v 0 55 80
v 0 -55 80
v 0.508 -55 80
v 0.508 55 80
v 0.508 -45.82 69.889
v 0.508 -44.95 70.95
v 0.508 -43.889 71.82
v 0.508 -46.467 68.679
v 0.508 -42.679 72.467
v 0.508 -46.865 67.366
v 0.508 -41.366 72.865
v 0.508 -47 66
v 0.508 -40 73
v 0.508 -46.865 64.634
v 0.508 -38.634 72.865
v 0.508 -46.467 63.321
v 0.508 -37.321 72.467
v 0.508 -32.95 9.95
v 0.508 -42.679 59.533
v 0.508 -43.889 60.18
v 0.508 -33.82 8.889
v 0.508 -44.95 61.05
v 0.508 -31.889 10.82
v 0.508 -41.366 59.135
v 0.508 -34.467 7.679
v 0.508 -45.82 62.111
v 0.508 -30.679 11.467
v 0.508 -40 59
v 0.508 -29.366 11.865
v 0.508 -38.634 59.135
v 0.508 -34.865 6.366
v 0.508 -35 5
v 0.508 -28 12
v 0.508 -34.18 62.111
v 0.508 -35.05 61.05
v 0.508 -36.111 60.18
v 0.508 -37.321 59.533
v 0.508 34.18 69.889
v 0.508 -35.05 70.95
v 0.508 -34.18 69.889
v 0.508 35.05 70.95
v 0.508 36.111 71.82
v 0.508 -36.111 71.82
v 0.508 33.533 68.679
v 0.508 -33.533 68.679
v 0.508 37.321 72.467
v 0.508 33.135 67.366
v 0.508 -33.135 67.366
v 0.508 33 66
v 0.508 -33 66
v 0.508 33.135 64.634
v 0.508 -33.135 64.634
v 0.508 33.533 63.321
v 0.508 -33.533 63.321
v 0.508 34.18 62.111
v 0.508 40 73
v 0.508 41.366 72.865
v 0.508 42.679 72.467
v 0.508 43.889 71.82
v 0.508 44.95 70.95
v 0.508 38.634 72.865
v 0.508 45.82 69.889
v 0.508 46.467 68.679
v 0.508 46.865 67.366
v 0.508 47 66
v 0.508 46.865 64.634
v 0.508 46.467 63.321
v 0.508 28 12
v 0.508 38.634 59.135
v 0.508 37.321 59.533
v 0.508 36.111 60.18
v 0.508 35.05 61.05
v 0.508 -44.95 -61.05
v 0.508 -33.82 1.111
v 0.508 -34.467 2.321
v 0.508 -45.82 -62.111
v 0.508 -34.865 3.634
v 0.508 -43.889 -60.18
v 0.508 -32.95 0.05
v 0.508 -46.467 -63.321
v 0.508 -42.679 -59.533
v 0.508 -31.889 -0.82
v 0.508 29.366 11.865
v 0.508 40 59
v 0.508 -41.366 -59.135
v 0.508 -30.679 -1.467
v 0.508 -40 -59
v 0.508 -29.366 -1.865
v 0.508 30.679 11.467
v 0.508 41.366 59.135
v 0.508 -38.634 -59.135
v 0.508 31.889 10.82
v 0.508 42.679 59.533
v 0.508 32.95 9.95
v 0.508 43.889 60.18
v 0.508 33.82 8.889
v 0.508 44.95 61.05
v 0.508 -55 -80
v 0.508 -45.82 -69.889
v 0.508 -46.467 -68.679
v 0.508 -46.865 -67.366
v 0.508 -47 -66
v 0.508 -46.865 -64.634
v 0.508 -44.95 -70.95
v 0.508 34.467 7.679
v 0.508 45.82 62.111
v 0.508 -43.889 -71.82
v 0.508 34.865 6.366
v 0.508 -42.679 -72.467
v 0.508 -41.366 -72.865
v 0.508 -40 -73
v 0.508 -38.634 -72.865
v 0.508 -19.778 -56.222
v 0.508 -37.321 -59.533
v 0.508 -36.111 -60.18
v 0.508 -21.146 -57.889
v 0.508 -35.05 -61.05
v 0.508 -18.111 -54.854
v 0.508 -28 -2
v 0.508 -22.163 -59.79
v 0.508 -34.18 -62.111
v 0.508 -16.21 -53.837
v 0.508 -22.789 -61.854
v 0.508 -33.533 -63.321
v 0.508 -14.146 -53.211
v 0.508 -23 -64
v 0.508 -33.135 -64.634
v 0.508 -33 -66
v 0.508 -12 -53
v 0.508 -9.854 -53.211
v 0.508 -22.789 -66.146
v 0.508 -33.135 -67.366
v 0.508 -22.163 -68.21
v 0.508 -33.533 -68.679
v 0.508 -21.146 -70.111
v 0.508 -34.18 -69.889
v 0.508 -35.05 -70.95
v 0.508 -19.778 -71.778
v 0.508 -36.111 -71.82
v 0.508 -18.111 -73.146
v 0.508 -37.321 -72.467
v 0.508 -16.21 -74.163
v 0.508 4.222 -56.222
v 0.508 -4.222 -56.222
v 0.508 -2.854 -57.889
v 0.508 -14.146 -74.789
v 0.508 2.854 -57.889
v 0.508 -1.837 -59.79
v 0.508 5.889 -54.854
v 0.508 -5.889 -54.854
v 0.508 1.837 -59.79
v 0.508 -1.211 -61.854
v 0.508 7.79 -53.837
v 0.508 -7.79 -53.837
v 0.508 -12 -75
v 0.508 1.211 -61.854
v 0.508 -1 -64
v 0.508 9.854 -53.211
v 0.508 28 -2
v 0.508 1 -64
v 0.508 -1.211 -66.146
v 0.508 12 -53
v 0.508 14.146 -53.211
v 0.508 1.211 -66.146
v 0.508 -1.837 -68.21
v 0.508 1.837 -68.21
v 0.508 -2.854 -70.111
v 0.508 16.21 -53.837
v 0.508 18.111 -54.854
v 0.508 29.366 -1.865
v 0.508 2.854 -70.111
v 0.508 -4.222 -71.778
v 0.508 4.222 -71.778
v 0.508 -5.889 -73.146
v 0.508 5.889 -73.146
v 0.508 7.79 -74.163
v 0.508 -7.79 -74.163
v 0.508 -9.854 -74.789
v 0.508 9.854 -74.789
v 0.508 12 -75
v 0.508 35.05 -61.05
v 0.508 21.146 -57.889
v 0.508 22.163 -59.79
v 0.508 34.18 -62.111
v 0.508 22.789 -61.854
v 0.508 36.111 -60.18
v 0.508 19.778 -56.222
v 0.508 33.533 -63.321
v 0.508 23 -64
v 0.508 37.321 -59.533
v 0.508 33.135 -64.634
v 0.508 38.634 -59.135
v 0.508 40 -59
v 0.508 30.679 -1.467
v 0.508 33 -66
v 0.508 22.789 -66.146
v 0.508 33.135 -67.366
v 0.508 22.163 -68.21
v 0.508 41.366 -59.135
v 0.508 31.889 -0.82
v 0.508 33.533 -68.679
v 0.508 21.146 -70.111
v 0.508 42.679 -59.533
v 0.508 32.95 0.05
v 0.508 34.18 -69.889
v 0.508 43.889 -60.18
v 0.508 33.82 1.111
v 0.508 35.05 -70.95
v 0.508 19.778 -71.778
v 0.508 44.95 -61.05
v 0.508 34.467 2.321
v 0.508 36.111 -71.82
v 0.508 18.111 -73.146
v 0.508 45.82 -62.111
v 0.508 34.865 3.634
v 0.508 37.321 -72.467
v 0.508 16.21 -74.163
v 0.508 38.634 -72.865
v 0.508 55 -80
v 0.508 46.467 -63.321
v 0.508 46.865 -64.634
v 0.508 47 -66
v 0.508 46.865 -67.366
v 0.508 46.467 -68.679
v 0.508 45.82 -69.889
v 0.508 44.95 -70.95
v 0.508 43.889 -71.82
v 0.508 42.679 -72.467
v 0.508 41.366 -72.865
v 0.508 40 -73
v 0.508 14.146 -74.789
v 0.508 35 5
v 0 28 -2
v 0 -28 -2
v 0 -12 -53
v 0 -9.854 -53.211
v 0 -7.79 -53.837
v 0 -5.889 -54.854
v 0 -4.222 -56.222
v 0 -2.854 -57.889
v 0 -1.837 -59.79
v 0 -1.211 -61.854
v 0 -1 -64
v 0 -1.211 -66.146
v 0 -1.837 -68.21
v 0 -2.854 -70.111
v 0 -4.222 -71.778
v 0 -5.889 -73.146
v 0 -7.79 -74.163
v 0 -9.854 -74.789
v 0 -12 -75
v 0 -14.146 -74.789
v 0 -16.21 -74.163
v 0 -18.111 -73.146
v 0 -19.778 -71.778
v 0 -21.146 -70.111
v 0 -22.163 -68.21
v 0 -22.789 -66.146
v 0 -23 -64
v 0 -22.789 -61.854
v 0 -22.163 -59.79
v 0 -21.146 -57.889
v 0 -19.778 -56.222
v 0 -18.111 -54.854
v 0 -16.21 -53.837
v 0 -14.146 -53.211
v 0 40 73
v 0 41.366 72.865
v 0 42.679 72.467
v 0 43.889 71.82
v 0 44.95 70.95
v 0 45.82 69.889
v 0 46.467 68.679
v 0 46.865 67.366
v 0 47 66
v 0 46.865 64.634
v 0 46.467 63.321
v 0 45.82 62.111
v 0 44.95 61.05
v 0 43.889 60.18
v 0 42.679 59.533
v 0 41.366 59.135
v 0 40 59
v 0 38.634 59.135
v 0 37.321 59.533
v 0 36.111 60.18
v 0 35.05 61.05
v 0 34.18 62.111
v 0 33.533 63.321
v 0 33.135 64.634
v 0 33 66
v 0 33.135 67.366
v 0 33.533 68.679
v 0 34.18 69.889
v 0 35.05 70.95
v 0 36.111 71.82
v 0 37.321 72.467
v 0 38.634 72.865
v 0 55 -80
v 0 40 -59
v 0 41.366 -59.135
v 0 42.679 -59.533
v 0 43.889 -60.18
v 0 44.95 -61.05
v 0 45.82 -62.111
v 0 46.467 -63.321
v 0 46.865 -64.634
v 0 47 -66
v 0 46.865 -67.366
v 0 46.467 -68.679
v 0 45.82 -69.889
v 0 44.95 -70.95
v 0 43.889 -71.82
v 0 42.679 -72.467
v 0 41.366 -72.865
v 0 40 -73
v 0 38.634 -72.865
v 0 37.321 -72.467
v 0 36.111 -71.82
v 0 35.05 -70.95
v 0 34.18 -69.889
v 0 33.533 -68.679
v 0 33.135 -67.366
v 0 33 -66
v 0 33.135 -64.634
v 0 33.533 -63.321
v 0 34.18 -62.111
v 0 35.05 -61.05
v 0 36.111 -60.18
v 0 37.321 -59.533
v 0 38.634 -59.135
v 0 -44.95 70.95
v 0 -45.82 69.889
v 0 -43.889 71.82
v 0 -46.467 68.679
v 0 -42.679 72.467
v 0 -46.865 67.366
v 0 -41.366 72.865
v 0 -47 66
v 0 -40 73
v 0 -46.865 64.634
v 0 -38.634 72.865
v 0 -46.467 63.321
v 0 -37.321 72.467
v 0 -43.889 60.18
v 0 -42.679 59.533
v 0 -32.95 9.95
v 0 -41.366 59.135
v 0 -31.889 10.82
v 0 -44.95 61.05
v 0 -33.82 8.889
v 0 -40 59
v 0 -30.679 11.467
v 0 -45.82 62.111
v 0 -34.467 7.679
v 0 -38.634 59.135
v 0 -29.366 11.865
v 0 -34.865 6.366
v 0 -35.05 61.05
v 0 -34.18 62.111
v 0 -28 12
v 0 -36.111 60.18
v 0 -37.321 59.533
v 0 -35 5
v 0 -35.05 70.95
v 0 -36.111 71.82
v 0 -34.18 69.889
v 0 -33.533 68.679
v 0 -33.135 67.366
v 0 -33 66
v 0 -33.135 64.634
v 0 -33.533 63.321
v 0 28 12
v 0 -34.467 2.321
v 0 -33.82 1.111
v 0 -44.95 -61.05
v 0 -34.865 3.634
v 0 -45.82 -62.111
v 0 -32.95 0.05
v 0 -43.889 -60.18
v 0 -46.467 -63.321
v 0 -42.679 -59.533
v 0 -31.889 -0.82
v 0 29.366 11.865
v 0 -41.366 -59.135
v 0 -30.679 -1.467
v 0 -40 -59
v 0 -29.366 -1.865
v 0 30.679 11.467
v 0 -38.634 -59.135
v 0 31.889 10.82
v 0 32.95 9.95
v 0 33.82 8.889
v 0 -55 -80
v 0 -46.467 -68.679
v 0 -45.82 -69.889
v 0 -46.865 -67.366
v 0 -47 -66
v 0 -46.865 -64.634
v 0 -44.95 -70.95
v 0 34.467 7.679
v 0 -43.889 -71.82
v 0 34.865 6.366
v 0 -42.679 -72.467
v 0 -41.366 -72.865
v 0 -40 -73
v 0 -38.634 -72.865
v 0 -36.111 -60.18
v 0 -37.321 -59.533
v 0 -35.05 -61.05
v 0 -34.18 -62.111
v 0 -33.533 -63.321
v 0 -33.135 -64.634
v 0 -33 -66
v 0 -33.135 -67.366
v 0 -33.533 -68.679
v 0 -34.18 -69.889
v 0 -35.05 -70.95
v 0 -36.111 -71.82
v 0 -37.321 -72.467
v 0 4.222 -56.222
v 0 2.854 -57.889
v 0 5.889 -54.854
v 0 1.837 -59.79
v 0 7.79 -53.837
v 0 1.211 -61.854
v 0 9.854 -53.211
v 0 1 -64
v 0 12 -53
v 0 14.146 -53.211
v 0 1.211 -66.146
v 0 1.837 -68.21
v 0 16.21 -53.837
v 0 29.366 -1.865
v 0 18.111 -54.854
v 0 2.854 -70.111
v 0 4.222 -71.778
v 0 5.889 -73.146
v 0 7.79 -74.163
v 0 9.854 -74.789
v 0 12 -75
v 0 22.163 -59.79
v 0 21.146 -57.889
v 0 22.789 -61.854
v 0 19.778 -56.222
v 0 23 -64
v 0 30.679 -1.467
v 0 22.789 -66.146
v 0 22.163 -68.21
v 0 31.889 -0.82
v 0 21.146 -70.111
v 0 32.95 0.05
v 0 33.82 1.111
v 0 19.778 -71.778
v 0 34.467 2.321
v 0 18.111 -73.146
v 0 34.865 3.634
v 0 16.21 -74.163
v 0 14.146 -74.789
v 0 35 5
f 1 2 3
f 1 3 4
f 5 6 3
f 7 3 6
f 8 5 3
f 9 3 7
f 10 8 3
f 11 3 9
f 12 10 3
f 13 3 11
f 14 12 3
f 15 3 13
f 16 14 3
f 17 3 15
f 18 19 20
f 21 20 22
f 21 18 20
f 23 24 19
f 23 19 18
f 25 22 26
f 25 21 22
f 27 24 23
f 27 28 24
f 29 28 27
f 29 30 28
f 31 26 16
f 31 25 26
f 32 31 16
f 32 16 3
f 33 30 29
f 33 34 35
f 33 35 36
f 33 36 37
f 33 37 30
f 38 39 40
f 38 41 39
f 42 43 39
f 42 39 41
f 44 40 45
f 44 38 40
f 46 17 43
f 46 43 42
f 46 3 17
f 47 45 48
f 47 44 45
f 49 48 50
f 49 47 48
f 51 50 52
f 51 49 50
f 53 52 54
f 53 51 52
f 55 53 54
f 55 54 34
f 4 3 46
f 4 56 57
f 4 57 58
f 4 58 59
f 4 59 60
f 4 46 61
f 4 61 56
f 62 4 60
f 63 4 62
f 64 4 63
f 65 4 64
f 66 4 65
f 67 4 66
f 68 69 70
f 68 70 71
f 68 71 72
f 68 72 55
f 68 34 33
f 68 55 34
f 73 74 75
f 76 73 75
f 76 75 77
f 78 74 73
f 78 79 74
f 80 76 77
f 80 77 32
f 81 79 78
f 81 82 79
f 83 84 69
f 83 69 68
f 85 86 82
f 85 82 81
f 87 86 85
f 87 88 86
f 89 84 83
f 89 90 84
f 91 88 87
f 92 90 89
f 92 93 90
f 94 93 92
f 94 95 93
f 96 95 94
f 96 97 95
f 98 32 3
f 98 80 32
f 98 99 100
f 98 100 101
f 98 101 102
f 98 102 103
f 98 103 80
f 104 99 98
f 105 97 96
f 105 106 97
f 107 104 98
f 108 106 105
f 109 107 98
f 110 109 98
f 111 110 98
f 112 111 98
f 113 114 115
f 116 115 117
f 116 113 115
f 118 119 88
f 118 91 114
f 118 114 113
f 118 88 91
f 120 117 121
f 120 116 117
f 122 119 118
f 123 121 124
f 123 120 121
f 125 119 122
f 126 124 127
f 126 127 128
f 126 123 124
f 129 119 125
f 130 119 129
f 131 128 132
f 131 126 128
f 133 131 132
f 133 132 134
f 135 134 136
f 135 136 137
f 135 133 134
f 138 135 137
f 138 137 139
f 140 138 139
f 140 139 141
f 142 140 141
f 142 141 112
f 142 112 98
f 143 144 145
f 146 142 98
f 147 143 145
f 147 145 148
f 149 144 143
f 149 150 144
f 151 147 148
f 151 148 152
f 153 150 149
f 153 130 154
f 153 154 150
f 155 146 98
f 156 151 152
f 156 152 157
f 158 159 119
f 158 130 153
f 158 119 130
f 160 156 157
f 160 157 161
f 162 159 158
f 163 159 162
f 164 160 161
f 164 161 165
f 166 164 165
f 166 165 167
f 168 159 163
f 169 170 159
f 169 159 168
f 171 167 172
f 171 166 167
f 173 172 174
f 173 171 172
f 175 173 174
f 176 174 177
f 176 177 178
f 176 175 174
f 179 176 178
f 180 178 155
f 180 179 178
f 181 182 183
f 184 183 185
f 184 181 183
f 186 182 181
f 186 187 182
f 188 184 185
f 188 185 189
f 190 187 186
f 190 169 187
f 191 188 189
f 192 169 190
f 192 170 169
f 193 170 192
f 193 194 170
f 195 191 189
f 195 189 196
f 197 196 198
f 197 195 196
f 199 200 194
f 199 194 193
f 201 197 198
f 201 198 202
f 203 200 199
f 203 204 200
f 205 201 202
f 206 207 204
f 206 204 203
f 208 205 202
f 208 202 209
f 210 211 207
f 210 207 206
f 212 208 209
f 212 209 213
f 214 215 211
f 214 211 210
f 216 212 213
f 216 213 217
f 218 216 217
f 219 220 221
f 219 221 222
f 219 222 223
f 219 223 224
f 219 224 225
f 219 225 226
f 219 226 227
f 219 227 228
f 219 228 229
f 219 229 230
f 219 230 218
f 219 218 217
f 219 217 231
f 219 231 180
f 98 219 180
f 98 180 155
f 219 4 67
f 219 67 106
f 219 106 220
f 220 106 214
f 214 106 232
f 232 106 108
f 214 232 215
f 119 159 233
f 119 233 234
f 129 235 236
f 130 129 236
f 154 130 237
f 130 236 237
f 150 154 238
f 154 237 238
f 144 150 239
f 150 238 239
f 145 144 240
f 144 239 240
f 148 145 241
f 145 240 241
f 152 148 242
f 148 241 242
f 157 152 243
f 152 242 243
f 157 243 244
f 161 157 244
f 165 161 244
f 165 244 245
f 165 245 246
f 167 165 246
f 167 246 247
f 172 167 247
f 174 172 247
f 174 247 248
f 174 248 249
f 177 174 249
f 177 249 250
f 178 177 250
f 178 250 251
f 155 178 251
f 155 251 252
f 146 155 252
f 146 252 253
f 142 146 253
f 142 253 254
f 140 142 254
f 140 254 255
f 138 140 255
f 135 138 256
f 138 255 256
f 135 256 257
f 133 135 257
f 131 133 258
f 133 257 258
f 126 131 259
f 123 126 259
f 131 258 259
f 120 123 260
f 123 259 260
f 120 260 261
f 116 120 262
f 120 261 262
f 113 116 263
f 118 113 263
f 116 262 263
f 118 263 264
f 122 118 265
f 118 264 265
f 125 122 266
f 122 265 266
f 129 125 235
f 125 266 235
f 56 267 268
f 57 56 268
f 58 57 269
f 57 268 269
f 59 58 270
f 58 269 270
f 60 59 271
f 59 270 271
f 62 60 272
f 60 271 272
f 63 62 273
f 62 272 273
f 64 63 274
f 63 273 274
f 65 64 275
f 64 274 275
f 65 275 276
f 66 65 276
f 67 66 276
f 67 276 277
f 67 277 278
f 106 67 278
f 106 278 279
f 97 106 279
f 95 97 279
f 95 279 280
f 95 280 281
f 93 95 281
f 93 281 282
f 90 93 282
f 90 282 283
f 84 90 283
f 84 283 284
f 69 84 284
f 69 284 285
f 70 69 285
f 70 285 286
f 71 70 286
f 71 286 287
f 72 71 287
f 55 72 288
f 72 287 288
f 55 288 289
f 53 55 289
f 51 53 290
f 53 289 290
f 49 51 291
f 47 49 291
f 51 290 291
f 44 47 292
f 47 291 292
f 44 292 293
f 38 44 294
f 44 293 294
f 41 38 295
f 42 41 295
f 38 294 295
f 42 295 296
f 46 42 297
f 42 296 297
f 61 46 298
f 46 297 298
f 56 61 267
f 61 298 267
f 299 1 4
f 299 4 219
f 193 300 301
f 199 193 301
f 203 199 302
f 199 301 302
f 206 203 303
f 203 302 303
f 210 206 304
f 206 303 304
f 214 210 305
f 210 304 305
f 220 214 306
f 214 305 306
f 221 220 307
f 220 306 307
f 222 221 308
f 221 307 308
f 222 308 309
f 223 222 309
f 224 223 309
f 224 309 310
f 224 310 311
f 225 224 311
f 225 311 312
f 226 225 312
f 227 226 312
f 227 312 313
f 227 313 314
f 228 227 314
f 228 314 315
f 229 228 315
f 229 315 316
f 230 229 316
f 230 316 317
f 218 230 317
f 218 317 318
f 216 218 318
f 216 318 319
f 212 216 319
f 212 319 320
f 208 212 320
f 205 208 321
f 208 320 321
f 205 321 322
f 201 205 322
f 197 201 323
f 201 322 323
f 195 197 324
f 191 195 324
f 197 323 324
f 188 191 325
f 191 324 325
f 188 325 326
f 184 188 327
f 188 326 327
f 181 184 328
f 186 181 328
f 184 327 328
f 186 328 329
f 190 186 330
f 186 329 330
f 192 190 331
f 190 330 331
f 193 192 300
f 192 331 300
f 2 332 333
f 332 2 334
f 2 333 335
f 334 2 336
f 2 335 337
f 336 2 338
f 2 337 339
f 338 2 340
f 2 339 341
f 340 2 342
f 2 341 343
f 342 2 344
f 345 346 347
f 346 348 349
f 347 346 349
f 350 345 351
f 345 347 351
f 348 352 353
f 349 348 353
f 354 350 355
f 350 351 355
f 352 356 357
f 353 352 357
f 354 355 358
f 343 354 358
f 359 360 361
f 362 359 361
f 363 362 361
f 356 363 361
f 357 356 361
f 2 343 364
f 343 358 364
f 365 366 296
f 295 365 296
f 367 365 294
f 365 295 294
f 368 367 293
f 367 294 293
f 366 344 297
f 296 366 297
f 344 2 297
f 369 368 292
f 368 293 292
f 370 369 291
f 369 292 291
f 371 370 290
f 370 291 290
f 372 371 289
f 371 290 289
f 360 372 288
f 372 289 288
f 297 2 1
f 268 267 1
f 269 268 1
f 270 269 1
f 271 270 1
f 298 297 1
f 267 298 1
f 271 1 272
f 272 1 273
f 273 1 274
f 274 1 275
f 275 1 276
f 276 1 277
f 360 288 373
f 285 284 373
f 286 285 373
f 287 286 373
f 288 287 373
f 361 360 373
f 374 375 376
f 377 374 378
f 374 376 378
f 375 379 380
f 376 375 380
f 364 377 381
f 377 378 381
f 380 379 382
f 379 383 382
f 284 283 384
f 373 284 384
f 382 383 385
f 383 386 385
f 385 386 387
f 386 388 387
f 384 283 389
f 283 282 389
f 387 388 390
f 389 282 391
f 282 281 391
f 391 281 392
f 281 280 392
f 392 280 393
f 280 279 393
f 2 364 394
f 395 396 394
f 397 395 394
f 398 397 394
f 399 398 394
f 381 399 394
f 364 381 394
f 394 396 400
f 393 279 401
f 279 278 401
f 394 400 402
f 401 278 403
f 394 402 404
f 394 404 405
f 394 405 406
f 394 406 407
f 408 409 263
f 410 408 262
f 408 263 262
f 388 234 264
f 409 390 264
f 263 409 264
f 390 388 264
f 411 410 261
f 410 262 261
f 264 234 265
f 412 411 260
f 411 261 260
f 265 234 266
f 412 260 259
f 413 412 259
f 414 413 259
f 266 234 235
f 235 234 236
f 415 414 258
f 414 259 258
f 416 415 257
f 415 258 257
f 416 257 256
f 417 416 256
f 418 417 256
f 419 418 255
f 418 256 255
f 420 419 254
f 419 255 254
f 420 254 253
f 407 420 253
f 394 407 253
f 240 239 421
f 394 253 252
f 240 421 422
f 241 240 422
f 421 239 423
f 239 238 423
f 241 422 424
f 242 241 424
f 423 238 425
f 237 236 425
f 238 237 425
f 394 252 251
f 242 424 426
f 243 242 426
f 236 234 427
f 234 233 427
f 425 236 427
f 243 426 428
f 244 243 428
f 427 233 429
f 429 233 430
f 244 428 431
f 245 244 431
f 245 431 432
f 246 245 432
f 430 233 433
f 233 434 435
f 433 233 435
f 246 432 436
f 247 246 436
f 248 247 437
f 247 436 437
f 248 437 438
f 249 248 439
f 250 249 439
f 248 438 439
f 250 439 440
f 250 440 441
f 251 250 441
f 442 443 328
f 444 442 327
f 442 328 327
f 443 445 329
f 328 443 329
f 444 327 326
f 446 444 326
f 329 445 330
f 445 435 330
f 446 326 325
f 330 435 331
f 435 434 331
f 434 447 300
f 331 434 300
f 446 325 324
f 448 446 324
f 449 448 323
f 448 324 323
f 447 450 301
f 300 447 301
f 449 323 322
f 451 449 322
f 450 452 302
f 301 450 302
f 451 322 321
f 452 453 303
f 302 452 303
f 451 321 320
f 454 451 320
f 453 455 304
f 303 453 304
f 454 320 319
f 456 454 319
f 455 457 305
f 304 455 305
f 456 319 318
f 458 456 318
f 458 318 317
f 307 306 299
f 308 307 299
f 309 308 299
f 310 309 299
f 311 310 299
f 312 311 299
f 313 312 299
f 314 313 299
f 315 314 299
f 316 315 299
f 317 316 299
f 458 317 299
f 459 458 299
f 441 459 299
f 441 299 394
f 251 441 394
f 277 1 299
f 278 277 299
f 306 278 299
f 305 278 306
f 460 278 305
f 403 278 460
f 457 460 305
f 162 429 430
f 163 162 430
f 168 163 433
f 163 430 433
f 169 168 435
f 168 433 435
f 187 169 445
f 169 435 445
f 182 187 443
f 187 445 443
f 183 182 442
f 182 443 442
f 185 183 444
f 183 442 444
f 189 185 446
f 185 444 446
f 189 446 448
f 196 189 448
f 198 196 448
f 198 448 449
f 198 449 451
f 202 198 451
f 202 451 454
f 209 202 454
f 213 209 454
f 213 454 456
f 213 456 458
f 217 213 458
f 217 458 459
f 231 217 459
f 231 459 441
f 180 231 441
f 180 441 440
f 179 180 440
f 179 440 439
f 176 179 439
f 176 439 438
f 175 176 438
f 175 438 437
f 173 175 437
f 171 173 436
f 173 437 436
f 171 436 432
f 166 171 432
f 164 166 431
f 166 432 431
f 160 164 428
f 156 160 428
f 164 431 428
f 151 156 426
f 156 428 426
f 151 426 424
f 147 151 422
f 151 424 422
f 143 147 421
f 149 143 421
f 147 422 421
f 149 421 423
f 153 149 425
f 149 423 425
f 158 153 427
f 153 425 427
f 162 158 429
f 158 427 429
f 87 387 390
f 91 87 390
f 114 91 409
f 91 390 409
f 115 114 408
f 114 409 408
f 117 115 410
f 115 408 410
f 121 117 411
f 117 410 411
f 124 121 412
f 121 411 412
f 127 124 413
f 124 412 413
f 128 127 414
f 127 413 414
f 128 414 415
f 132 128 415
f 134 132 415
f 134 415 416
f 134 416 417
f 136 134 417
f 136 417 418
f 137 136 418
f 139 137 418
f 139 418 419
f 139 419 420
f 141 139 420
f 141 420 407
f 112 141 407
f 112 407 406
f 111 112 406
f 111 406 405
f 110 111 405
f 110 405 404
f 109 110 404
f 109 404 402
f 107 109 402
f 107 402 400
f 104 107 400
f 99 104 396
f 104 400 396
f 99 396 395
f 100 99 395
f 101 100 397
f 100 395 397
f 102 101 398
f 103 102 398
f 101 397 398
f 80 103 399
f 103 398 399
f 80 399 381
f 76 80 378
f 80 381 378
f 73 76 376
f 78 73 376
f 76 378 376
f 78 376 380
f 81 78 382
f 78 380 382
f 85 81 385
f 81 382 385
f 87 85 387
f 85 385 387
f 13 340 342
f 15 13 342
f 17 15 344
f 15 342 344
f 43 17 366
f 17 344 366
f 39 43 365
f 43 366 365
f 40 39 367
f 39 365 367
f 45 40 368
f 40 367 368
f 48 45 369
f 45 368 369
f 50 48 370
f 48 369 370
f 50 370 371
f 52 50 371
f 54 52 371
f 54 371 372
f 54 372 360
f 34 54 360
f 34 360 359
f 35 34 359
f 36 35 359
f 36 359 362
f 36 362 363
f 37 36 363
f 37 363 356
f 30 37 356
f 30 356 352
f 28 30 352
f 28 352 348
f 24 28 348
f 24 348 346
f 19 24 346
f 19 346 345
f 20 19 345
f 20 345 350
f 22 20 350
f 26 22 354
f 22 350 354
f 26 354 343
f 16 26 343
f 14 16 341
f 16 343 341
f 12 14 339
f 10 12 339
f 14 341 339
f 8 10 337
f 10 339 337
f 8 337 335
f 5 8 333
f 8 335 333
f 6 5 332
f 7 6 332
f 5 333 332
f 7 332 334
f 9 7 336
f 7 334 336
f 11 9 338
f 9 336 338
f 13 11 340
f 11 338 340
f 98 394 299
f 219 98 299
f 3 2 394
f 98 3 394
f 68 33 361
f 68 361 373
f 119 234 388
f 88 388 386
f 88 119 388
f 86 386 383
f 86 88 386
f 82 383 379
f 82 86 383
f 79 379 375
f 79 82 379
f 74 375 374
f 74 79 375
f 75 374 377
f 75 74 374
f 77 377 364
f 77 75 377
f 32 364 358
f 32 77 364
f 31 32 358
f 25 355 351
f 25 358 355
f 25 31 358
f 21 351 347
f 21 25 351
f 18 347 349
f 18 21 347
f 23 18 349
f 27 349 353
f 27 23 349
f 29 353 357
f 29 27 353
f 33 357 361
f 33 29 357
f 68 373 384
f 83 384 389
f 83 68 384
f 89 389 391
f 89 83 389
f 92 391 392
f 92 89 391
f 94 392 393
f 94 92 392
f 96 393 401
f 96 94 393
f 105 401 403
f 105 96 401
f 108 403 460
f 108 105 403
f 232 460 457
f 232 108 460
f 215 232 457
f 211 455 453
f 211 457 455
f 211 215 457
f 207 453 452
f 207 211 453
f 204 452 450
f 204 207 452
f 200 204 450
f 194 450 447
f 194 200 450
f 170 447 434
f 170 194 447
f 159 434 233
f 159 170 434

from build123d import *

# Parameters (mm, degrees)
SKETCH1_W             = 160
SKETCH1_H             = 110
BOSS_EXTRUDE1_DEPTH   = 0.508
M12_CLEARANCE_HOLE1_D = 14
CUT_EXTRUDE1_DEPTH    = 98.083768283
M20_CLEARANCE_HOLE1_D = 22


with BuildPart() as part:
    # Sketch1 → Boss-Extrude1 (new body)
    with BuildSketch(Plane(origin=(0, 0, 0), x_dir=(0, 0, -1), z_dir=(1, 0, 0))):
        Rectangle(SKETCH1_W, SKETCH1_H)
    extrude(amount=BOSS_EXTRUDE1_DEPTH)

    # M12 Clearance Hole1 (through all)
    with Locations(Plane(origin=(0.508, 0, 0), x_dir=(0, 0, -1), z_dir=(1, 0, 0))):
        with Locations((-66, 40), (66, 40), (66, -40), (-66, -40)):
            Hole(M12_CLEARANCE_HOLE1_D / 2)

    # Sketch4 → Cut-Extrude1 (cut, through all)
    with BuildSketch(Plane(origin=(0.508, 0, 0), x_dir=(0, 0, -1), z_dir=(1, 0, 0))):
        with BuildLine():
            Line((2, 28), (2, -28))
            ThreePointArc((2, -28), (-5, -35), (-12, -28))
            Line((-12, -28), (-12, 28))
            ThreePointArc((-12, 28), (-5, 35), (2, 28))
        make_face()
    extrude(amount=-CUT_EXTRUDE1_DEPTH, mode=Mode.SUBTRACT)

    # M20 Clearance Hole1 (through all)
    with Locations(Plane(origin=(0.508, 0, 0), x_dir=(0, 0, -1), z_dir=(1, 0, 0))):
        with Locations((64, 12), (64, -12)):
            Hole(M20_CLEARANCE_HOLE1_D / 2)


solid = part.part
